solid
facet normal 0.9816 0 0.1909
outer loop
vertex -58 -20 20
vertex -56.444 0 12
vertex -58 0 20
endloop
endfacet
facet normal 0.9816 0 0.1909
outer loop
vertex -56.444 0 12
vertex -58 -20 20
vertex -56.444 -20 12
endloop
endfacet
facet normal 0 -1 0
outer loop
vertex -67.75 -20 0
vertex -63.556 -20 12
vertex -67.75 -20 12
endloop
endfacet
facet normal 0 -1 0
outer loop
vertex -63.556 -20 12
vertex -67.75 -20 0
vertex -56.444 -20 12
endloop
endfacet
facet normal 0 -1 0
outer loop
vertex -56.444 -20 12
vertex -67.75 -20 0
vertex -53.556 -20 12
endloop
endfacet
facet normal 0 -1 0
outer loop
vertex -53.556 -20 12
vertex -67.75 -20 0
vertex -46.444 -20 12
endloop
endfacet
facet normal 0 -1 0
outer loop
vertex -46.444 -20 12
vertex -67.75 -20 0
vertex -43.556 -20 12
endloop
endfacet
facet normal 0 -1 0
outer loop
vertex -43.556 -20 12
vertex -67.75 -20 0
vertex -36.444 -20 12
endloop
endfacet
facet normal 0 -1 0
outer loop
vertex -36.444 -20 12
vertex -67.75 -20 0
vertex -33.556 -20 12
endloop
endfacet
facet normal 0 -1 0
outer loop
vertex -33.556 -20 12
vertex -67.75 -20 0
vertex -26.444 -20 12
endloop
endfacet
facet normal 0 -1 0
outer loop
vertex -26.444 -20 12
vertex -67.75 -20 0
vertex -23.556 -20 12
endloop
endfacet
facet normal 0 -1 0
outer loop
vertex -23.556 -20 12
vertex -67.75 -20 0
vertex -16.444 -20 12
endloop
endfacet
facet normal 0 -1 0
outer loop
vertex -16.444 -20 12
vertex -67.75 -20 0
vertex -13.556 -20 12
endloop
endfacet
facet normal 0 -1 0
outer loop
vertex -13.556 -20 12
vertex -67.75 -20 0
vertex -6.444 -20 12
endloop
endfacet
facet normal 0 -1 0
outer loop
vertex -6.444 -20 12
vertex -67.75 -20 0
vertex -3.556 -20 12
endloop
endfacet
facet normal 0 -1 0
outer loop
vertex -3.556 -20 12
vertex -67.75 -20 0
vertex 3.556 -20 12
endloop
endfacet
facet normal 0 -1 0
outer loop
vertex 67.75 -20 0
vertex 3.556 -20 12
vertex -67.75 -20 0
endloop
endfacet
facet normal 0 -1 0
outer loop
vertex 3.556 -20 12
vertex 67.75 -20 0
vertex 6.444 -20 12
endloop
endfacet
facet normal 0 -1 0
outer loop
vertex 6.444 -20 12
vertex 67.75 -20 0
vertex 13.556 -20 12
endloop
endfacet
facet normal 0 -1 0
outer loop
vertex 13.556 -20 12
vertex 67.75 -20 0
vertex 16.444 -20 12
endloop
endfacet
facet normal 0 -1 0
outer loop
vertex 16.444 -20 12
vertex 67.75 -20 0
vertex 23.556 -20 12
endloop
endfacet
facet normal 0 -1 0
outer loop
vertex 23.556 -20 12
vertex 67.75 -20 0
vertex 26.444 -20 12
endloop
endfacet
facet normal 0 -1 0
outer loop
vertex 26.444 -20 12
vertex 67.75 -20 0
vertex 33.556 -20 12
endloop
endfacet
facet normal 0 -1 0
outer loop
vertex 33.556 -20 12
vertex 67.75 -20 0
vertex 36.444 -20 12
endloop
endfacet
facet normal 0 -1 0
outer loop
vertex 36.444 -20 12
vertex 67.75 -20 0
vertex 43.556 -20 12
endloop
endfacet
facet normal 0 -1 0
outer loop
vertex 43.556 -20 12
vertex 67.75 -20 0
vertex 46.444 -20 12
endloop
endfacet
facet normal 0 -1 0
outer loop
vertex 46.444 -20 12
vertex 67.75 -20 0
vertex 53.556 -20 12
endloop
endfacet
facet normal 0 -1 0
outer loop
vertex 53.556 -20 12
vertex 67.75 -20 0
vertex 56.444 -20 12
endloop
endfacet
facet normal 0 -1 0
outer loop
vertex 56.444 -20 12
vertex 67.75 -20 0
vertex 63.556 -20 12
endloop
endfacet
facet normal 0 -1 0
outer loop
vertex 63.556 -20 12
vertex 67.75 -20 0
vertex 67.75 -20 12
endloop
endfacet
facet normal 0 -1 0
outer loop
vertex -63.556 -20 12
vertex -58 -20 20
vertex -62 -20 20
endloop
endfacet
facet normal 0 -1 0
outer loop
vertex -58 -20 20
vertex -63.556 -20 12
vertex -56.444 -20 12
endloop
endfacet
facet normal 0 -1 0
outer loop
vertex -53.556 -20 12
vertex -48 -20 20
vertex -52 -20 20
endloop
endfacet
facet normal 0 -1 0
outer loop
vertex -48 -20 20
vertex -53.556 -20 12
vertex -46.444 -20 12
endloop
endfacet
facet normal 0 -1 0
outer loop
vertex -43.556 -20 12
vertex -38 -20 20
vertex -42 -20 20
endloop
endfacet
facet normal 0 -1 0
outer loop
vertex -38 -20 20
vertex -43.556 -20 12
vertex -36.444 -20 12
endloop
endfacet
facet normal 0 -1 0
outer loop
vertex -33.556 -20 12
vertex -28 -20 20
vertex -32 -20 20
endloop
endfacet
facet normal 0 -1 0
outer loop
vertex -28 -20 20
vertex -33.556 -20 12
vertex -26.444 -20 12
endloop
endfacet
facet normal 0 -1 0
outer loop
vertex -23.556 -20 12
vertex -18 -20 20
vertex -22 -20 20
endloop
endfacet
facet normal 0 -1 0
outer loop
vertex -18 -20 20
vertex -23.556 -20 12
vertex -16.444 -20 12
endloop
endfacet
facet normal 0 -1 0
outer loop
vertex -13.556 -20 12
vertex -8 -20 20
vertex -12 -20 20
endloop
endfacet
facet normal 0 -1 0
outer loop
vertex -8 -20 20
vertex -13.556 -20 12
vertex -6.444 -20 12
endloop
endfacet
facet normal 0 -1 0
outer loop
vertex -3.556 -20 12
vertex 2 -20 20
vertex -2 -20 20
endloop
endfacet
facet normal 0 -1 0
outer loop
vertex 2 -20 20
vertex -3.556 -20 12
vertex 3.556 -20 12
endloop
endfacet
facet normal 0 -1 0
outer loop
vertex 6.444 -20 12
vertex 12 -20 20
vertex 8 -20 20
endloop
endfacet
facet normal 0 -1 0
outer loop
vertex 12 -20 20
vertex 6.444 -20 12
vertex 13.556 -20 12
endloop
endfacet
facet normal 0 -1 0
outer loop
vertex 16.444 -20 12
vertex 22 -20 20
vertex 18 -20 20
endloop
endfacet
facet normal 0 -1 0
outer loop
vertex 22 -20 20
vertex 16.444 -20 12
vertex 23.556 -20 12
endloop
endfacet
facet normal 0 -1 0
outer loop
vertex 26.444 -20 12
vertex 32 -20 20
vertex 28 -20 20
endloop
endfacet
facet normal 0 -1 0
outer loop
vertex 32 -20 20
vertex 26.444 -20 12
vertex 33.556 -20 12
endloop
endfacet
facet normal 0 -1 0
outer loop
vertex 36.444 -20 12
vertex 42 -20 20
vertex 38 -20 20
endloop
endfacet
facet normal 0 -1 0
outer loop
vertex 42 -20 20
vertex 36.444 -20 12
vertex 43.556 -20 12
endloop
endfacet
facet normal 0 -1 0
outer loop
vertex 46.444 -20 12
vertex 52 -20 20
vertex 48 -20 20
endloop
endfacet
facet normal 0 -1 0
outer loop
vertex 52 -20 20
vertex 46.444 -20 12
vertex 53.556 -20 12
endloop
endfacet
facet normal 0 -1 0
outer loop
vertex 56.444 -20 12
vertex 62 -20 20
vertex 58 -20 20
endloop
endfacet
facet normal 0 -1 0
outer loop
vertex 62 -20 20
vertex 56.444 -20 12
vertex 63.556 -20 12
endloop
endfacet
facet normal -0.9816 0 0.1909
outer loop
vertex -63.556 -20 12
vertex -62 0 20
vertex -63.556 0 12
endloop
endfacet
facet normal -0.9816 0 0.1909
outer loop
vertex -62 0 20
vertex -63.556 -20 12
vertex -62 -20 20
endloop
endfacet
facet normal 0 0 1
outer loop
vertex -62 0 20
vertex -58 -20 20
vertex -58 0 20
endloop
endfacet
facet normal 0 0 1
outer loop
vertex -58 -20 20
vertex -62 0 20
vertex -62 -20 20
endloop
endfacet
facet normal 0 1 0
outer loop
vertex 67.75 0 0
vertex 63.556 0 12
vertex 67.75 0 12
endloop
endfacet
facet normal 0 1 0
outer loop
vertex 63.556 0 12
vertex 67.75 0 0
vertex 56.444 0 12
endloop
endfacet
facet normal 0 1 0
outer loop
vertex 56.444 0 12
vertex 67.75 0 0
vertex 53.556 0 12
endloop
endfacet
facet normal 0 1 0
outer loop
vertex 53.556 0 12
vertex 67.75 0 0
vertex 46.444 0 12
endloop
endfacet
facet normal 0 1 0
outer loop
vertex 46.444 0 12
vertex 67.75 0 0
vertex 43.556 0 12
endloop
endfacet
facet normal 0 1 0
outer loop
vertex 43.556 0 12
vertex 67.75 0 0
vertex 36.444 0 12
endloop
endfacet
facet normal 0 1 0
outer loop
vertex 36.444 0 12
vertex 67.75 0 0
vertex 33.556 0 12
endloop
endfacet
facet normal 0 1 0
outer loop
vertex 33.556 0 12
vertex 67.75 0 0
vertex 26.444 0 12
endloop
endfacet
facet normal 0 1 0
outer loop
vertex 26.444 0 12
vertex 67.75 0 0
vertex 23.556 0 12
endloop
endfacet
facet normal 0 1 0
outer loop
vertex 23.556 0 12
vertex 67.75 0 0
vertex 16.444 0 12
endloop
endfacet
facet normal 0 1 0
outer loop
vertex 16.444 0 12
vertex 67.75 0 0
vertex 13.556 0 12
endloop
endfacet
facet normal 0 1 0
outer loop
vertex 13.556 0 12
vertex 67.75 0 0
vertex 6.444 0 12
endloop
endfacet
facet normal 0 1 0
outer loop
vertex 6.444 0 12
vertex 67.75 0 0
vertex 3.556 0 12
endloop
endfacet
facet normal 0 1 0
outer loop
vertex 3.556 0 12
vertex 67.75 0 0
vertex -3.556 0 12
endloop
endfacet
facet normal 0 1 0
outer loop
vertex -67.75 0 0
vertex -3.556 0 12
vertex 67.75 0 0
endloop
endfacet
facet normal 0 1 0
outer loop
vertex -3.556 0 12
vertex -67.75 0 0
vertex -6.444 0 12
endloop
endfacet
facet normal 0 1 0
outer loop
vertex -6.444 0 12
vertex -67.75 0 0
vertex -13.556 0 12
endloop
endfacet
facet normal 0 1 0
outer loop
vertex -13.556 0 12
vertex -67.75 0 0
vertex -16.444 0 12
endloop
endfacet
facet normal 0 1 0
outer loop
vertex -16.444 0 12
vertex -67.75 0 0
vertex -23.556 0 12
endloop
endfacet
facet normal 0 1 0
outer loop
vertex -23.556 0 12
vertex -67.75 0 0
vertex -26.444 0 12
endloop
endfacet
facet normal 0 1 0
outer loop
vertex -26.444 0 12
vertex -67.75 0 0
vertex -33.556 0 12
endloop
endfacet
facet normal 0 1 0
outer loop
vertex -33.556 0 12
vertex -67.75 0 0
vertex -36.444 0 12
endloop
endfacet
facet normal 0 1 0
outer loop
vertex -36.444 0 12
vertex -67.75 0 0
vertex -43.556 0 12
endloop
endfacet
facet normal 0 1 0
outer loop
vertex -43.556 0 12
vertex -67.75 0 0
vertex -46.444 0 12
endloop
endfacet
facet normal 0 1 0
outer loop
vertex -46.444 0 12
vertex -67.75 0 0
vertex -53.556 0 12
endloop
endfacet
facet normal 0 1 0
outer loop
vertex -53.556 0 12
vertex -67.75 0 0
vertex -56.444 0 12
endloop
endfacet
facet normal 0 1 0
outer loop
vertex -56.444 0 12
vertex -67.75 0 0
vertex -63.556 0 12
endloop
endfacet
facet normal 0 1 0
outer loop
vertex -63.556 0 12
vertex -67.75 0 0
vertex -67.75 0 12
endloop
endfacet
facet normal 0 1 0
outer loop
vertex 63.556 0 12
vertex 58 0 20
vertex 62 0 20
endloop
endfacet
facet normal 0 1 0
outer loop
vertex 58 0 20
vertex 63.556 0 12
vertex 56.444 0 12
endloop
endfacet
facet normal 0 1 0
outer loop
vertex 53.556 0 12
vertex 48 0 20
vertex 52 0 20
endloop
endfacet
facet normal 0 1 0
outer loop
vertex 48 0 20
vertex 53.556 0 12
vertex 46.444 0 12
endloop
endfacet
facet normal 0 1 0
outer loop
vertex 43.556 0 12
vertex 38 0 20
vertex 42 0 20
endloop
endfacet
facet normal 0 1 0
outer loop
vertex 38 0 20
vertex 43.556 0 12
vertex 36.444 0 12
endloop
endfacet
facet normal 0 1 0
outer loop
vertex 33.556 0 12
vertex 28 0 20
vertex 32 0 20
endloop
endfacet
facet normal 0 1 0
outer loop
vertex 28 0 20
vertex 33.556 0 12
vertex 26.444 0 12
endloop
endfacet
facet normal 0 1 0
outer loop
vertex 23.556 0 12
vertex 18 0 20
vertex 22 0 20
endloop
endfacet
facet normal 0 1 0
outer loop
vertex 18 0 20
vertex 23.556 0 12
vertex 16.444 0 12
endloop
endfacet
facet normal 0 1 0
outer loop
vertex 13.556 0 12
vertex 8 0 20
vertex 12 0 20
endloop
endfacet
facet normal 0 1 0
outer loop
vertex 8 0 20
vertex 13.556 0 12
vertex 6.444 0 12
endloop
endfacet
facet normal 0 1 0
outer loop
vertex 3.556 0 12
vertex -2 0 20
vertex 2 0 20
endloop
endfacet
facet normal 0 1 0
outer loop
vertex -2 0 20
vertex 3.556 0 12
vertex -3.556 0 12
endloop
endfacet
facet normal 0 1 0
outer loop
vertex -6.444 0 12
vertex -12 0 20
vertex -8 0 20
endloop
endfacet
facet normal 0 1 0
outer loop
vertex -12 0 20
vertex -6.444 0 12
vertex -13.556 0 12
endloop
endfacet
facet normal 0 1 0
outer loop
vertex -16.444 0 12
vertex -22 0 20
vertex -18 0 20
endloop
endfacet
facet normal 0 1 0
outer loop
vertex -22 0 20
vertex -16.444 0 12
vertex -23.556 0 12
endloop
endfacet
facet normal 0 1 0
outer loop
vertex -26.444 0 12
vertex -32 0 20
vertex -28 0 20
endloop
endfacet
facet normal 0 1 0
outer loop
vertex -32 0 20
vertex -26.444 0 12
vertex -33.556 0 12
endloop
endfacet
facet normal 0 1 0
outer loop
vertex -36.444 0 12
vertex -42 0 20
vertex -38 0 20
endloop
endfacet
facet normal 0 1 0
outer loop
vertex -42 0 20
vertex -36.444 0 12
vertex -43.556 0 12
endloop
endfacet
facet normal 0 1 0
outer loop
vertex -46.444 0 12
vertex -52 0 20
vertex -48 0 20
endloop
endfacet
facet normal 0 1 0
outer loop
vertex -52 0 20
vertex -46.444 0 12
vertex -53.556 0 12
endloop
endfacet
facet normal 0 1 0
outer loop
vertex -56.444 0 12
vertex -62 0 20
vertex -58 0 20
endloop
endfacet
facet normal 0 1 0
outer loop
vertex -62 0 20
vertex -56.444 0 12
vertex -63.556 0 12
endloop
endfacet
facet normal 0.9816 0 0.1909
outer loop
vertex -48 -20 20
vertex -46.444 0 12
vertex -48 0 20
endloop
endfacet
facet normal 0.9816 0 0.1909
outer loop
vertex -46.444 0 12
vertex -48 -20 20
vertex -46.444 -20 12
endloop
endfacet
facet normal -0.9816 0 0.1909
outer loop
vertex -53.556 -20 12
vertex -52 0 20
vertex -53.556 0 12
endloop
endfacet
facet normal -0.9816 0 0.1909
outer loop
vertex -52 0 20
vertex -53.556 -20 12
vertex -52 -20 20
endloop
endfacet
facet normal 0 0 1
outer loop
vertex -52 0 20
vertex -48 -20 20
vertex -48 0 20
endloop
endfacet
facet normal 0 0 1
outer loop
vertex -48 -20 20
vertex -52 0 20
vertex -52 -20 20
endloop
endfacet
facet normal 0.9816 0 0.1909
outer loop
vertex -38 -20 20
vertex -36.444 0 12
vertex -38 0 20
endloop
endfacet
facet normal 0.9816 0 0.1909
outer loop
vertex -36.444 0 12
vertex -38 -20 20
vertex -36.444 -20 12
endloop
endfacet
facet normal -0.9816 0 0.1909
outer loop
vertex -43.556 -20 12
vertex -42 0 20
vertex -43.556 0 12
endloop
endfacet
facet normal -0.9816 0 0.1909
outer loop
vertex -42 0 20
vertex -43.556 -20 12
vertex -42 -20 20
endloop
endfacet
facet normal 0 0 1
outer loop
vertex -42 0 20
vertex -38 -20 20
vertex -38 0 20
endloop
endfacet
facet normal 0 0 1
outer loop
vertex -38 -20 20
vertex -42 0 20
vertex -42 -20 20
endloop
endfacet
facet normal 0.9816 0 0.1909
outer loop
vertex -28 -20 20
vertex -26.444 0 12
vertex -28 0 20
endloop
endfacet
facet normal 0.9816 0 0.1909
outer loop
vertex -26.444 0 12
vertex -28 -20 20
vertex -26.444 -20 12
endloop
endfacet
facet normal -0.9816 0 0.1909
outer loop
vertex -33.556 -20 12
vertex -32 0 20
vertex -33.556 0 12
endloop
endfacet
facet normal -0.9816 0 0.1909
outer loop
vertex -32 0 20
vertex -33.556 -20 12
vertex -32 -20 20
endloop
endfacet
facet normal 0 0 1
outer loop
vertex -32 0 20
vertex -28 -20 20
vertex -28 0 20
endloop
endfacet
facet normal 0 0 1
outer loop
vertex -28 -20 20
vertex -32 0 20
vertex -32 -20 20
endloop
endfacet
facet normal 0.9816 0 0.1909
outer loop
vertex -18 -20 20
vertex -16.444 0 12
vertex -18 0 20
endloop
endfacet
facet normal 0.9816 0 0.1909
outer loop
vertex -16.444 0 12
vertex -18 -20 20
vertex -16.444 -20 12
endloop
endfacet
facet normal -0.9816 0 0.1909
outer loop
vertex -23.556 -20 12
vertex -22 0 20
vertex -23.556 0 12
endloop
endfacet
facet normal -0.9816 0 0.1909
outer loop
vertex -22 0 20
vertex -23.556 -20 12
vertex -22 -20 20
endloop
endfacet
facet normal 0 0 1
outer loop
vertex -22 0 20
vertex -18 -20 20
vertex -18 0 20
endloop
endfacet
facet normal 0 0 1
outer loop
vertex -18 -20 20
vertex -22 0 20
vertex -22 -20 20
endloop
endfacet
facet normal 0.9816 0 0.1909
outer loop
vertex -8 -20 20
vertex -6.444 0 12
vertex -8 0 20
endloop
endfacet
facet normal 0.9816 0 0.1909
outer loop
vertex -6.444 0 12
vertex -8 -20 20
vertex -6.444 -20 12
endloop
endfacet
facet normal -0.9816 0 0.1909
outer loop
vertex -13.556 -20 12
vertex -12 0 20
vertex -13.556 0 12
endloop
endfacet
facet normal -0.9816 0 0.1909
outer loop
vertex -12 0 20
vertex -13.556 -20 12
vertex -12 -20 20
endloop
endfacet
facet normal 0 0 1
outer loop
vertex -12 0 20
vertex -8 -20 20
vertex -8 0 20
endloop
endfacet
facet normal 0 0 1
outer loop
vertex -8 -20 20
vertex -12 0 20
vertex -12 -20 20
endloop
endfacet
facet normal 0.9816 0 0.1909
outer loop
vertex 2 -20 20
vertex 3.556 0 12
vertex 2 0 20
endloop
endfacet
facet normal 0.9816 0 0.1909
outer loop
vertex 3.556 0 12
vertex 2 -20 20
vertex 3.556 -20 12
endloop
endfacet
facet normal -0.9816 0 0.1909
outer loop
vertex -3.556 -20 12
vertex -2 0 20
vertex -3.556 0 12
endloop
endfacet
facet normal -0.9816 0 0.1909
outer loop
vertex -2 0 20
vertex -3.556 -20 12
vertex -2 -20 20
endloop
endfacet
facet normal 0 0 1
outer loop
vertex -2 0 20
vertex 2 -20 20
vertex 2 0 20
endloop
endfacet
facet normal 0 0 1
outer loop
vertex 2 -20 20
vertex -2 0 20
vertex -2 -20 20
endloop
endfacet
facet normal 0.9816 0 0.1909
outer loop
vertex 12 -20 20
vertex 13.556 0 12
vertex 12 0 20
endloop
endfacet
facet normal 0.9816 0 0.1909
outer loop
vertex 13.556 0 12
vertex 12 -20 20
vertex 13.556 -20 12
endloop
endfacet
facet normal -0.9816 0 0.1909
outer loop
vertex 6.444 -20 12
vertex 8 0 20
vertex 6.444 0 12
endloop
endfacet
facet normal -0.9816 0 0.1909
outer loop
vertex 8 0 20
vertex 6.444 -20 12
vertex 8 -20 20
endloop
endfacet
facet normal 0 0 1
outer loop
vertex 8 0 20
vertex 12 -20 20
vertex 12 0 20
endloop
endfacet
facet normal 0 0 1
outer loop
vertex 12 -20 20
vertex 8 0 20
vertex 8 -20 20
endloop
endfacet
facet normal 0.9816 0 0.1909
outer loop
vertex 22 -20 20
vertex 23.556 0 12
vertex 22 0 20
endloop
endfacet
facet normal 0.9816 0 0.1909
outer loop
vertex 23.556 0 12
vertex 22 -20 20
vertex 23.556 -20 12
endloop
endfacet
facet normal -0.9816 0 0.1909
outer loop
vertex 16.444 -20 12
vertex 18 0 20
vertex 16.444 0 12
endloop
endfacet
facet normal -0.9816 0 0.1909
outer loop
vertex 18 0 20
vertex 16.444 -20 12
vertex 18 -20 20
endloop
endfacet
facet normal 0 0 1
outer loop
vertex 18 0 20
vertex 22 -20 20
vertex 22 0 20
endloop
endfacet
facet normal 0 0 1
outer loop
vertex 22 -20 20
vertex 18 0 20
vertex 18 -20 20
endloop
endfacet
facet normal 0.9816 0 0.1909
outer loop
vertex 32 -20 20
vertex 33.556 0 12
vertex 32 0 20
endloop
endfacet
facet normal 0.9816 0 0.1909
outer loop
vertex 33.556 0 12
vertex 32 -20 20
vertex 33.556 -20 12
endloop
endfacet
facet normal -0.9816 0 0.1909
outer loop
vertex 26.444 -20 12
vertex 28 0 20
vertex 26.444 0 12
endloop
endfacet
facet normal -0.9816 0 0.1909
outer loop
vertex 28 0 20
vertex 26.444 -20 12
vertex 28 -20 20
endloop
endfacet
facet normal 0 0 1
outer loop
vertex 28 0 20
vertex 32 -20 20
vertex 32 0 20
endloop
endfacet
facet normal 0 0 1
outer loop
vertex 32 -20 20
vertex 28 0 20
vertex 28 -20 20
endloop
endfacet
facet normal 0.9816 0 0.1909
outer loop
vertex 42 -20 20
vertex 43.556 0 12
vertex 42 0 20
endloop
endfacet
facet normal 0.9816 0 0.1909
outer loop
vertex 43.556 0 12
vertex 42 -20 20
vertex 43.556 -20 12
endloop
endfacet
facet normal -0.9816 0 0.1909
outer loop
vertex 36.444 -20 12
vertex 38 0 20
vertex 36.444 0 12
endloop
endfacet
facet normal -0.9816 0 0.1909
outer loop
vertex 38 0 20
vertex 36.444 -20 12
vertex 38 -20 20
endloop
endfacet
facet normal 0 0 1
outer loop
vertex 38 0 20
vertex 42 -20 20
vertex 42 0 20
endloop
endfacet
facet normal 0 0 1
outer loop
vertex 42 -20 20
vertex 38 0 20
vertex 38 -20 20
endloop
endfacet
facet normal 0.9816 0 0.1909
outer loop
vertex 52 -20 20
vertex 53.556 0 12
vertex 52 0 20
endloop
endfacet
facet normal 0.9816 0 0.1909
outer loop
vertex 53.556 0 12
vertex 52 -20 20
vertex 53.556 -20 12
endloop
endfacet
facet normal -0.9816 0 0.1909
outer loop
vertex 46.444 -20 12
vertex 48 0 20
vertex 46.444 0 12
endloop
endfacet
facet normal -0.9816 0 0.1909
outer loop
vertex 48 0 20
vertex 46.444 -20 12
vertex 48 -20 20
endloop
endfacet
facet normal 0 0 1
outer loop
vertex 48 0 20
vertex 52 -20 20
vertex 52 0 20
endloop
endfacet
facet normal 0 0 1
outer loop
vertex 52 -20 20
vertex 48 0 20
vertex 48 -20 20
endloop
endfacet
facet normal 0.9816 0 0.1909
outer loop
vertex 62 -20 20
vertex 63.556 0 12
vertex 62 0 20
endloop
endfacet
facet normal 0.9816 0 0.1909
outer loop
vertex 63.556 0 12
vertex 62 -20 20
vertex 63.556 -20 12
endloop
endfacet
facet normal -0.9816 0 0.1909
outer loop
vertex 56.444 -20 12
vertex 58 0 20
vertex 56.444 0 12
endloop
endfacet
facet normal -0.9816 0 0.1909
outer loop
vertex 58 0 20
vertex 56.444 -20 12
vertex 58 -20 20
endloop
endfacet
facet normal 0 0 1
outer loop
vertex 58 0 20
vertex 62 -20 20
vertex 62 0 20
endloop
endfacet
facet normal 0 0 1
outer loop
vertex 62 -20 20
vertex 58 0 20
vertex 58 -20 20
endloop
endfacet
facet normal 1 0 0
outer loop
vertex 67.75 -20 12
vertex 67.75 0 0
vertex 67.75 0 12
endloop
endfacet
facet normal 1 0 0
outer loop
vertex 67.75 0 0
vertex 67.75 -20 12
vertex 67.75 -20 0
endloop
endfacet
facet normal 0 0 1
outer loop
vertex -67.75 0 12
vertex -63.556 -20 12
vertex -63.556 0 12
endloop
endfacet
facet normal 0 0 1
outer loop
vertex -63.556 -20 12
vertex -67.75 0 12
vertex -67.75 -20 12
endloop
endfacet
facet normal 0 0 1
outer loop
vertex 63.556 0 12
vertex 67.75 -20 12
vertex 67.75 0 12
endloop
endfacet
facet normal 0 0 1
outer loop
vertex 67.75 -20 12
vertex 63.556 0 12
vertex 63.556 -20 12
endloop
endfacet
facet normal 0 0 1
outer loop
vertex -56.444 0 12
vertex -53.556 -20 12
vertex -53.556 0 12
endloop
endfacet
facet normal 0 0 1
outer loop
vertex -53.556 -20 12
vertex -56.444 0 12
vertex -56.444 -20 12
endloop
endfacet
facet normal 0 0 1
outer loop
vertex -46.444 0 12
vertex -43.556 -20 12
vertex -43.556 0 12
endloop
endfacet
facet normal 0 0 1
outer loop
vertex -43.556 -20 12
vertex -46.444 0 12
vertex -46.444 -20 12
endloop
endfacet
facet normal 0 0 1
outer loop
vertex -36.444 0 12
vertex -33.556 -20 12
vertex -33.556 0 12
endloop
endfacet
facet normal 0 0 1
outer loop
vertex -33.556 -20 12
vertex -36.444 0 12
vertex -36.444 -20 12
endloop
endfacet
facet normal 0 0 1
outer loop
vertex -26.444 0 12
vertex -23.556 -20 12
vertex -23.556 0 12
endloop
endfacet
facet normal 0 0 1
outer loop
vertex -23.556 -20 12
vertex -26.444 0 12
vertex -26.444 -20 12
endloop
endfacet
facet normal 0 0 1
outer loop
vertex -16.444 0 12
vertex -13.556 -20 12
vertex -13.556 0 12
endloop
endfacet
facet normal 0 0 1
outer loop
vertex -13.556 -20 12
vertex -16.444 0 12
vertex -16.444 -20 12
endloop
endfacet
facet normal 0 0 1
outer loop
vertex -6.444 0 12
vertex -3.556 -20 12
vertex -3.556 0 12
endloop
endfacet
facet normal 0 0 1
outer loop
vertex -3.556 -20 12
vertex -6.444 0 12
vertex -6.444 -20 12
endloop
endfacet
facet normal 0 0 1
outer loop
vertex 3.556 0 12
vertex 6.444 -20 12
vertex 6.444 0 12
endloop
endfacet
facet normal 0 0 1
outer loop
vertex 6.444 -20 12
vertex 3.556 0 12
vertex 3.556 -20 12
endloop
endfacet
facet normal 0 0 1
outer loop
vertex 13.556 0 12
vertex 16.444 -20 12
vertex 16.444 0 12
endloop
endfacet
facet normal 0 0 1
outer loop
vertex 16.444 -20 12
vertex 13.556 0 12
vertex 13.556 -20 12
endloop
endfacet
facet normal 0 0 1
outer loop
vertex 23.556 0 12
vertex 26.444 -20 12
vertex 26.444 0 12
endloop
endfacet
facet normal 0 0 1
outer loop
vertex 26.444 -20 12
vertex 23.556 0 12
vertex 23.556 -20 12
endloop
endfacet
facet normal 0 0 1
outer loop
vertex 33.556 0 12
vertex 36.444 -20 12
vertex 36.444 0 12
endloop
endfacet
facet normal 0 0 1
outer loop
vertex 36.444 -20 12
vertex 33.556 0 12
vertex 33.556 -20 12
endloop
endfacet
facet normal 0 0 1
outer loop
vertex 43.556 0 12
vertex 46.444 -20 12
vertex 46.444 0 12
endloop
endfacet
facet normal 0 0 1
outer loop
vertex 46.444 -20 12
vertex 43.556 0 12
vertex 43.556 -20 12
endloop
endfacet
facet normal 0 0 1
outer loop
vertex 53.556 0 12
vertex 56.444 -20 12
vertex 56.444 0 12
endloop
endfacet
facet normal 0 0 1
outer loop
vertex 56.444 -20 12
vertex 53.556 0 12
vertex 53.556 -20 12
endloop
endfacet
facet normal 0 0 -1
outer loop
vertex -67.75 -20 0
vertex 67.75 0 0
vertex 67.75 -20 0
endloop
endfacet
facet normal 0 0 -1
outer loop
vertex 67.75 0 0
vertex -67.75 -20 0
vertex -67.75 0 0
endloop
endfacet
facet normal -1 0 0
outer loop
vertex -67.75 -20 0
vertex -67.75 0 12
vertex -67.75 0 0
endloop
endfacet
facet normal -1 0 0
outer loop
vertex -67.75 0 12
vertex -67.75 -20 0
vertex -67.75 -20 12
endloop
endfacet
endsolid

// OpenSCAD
$fn = 32;

// ----------------------------------------------------------------------
// Toothed rack, 13 teeth
// 10 mm pitch, 8 mm teeth
// ----------------------------------------------------------------------

// --- parameters (mm) ---
bar_w = 20;    // bar width (Y)
bar_h = 12;    // bar height (Z)
teeth = 13;    // number of teeth
pitch = 10;    // tooth pitch
tooth_h = 8;   // tooth height above the bar
root_w = 7.5;  // tooth width at the root
crest_w = 4;   // tooth width at the crest

// --- derived feature positions (mm) ---
span = (teeth - 1) * pitch;  // = 120   distance between the outer teeth
bar_l = span + root_w + 8;   // = 135.5   bar length: teeth plus 4 mm at each end
tooth_x = -span / 2;         // = -60   X of the first tooth
height = bar_h + tooth_h;    // = 20   overall height
feature_centers = [
  [tooth_x + 0 * pitch, -bar_w / 2],
  [tooth_x + 1 * pitch, -bar_w / 2],
  [tooth_x + 2 * pitch, -bar_w / 2],
  [tooth_x + 3 * pitch, -bar_w / 2],
  [tooth_x + 4 * pitch, -bar_w / 2],
  [tooth_x + 5 * pitch, -bar_w / 2],
  [tooth_x + 6 * pitch, -bar_w / 2],
  [tooth_x + 7 * pitch, -bar_w / 2],
  [tooth_x + 8 * pitch, -bar_w / 2],
  [tooth_x + 9 * pitch, -bar_w / 2],
  [tooth_x + 10 * pitch, -bar_w / 2],
  [tooth_x + 11 * pitch, -bar_w / 2],
  [tooth_x + 12 * pitch, -bar_w / 2]
];   // tooth centre line, drives the tooth loop

// bar with a rack of teeth, one extruded trapezoium per centre
module rack_tooth() {
  linear_extrude(height = bar_w)
    polygon(points = [
      [0, 0],
      [root_w, 0],
      [root_w / 2 + crest_w / 2, tooth_h + 1],
      [root_w / 2 - crest_w / 2, tooth_h + 1]
    ]);
}

union() {
  translate([-bar_l / 2, -bar_w, 0]) cube([bar_l, bar_w, bar_h]);
  for (centre = feature_centers)
    translate([centre[0] - root_w / 2, 0, bar_h - 1]) rotate([90, 0, 0]) rack_tooth();
}
